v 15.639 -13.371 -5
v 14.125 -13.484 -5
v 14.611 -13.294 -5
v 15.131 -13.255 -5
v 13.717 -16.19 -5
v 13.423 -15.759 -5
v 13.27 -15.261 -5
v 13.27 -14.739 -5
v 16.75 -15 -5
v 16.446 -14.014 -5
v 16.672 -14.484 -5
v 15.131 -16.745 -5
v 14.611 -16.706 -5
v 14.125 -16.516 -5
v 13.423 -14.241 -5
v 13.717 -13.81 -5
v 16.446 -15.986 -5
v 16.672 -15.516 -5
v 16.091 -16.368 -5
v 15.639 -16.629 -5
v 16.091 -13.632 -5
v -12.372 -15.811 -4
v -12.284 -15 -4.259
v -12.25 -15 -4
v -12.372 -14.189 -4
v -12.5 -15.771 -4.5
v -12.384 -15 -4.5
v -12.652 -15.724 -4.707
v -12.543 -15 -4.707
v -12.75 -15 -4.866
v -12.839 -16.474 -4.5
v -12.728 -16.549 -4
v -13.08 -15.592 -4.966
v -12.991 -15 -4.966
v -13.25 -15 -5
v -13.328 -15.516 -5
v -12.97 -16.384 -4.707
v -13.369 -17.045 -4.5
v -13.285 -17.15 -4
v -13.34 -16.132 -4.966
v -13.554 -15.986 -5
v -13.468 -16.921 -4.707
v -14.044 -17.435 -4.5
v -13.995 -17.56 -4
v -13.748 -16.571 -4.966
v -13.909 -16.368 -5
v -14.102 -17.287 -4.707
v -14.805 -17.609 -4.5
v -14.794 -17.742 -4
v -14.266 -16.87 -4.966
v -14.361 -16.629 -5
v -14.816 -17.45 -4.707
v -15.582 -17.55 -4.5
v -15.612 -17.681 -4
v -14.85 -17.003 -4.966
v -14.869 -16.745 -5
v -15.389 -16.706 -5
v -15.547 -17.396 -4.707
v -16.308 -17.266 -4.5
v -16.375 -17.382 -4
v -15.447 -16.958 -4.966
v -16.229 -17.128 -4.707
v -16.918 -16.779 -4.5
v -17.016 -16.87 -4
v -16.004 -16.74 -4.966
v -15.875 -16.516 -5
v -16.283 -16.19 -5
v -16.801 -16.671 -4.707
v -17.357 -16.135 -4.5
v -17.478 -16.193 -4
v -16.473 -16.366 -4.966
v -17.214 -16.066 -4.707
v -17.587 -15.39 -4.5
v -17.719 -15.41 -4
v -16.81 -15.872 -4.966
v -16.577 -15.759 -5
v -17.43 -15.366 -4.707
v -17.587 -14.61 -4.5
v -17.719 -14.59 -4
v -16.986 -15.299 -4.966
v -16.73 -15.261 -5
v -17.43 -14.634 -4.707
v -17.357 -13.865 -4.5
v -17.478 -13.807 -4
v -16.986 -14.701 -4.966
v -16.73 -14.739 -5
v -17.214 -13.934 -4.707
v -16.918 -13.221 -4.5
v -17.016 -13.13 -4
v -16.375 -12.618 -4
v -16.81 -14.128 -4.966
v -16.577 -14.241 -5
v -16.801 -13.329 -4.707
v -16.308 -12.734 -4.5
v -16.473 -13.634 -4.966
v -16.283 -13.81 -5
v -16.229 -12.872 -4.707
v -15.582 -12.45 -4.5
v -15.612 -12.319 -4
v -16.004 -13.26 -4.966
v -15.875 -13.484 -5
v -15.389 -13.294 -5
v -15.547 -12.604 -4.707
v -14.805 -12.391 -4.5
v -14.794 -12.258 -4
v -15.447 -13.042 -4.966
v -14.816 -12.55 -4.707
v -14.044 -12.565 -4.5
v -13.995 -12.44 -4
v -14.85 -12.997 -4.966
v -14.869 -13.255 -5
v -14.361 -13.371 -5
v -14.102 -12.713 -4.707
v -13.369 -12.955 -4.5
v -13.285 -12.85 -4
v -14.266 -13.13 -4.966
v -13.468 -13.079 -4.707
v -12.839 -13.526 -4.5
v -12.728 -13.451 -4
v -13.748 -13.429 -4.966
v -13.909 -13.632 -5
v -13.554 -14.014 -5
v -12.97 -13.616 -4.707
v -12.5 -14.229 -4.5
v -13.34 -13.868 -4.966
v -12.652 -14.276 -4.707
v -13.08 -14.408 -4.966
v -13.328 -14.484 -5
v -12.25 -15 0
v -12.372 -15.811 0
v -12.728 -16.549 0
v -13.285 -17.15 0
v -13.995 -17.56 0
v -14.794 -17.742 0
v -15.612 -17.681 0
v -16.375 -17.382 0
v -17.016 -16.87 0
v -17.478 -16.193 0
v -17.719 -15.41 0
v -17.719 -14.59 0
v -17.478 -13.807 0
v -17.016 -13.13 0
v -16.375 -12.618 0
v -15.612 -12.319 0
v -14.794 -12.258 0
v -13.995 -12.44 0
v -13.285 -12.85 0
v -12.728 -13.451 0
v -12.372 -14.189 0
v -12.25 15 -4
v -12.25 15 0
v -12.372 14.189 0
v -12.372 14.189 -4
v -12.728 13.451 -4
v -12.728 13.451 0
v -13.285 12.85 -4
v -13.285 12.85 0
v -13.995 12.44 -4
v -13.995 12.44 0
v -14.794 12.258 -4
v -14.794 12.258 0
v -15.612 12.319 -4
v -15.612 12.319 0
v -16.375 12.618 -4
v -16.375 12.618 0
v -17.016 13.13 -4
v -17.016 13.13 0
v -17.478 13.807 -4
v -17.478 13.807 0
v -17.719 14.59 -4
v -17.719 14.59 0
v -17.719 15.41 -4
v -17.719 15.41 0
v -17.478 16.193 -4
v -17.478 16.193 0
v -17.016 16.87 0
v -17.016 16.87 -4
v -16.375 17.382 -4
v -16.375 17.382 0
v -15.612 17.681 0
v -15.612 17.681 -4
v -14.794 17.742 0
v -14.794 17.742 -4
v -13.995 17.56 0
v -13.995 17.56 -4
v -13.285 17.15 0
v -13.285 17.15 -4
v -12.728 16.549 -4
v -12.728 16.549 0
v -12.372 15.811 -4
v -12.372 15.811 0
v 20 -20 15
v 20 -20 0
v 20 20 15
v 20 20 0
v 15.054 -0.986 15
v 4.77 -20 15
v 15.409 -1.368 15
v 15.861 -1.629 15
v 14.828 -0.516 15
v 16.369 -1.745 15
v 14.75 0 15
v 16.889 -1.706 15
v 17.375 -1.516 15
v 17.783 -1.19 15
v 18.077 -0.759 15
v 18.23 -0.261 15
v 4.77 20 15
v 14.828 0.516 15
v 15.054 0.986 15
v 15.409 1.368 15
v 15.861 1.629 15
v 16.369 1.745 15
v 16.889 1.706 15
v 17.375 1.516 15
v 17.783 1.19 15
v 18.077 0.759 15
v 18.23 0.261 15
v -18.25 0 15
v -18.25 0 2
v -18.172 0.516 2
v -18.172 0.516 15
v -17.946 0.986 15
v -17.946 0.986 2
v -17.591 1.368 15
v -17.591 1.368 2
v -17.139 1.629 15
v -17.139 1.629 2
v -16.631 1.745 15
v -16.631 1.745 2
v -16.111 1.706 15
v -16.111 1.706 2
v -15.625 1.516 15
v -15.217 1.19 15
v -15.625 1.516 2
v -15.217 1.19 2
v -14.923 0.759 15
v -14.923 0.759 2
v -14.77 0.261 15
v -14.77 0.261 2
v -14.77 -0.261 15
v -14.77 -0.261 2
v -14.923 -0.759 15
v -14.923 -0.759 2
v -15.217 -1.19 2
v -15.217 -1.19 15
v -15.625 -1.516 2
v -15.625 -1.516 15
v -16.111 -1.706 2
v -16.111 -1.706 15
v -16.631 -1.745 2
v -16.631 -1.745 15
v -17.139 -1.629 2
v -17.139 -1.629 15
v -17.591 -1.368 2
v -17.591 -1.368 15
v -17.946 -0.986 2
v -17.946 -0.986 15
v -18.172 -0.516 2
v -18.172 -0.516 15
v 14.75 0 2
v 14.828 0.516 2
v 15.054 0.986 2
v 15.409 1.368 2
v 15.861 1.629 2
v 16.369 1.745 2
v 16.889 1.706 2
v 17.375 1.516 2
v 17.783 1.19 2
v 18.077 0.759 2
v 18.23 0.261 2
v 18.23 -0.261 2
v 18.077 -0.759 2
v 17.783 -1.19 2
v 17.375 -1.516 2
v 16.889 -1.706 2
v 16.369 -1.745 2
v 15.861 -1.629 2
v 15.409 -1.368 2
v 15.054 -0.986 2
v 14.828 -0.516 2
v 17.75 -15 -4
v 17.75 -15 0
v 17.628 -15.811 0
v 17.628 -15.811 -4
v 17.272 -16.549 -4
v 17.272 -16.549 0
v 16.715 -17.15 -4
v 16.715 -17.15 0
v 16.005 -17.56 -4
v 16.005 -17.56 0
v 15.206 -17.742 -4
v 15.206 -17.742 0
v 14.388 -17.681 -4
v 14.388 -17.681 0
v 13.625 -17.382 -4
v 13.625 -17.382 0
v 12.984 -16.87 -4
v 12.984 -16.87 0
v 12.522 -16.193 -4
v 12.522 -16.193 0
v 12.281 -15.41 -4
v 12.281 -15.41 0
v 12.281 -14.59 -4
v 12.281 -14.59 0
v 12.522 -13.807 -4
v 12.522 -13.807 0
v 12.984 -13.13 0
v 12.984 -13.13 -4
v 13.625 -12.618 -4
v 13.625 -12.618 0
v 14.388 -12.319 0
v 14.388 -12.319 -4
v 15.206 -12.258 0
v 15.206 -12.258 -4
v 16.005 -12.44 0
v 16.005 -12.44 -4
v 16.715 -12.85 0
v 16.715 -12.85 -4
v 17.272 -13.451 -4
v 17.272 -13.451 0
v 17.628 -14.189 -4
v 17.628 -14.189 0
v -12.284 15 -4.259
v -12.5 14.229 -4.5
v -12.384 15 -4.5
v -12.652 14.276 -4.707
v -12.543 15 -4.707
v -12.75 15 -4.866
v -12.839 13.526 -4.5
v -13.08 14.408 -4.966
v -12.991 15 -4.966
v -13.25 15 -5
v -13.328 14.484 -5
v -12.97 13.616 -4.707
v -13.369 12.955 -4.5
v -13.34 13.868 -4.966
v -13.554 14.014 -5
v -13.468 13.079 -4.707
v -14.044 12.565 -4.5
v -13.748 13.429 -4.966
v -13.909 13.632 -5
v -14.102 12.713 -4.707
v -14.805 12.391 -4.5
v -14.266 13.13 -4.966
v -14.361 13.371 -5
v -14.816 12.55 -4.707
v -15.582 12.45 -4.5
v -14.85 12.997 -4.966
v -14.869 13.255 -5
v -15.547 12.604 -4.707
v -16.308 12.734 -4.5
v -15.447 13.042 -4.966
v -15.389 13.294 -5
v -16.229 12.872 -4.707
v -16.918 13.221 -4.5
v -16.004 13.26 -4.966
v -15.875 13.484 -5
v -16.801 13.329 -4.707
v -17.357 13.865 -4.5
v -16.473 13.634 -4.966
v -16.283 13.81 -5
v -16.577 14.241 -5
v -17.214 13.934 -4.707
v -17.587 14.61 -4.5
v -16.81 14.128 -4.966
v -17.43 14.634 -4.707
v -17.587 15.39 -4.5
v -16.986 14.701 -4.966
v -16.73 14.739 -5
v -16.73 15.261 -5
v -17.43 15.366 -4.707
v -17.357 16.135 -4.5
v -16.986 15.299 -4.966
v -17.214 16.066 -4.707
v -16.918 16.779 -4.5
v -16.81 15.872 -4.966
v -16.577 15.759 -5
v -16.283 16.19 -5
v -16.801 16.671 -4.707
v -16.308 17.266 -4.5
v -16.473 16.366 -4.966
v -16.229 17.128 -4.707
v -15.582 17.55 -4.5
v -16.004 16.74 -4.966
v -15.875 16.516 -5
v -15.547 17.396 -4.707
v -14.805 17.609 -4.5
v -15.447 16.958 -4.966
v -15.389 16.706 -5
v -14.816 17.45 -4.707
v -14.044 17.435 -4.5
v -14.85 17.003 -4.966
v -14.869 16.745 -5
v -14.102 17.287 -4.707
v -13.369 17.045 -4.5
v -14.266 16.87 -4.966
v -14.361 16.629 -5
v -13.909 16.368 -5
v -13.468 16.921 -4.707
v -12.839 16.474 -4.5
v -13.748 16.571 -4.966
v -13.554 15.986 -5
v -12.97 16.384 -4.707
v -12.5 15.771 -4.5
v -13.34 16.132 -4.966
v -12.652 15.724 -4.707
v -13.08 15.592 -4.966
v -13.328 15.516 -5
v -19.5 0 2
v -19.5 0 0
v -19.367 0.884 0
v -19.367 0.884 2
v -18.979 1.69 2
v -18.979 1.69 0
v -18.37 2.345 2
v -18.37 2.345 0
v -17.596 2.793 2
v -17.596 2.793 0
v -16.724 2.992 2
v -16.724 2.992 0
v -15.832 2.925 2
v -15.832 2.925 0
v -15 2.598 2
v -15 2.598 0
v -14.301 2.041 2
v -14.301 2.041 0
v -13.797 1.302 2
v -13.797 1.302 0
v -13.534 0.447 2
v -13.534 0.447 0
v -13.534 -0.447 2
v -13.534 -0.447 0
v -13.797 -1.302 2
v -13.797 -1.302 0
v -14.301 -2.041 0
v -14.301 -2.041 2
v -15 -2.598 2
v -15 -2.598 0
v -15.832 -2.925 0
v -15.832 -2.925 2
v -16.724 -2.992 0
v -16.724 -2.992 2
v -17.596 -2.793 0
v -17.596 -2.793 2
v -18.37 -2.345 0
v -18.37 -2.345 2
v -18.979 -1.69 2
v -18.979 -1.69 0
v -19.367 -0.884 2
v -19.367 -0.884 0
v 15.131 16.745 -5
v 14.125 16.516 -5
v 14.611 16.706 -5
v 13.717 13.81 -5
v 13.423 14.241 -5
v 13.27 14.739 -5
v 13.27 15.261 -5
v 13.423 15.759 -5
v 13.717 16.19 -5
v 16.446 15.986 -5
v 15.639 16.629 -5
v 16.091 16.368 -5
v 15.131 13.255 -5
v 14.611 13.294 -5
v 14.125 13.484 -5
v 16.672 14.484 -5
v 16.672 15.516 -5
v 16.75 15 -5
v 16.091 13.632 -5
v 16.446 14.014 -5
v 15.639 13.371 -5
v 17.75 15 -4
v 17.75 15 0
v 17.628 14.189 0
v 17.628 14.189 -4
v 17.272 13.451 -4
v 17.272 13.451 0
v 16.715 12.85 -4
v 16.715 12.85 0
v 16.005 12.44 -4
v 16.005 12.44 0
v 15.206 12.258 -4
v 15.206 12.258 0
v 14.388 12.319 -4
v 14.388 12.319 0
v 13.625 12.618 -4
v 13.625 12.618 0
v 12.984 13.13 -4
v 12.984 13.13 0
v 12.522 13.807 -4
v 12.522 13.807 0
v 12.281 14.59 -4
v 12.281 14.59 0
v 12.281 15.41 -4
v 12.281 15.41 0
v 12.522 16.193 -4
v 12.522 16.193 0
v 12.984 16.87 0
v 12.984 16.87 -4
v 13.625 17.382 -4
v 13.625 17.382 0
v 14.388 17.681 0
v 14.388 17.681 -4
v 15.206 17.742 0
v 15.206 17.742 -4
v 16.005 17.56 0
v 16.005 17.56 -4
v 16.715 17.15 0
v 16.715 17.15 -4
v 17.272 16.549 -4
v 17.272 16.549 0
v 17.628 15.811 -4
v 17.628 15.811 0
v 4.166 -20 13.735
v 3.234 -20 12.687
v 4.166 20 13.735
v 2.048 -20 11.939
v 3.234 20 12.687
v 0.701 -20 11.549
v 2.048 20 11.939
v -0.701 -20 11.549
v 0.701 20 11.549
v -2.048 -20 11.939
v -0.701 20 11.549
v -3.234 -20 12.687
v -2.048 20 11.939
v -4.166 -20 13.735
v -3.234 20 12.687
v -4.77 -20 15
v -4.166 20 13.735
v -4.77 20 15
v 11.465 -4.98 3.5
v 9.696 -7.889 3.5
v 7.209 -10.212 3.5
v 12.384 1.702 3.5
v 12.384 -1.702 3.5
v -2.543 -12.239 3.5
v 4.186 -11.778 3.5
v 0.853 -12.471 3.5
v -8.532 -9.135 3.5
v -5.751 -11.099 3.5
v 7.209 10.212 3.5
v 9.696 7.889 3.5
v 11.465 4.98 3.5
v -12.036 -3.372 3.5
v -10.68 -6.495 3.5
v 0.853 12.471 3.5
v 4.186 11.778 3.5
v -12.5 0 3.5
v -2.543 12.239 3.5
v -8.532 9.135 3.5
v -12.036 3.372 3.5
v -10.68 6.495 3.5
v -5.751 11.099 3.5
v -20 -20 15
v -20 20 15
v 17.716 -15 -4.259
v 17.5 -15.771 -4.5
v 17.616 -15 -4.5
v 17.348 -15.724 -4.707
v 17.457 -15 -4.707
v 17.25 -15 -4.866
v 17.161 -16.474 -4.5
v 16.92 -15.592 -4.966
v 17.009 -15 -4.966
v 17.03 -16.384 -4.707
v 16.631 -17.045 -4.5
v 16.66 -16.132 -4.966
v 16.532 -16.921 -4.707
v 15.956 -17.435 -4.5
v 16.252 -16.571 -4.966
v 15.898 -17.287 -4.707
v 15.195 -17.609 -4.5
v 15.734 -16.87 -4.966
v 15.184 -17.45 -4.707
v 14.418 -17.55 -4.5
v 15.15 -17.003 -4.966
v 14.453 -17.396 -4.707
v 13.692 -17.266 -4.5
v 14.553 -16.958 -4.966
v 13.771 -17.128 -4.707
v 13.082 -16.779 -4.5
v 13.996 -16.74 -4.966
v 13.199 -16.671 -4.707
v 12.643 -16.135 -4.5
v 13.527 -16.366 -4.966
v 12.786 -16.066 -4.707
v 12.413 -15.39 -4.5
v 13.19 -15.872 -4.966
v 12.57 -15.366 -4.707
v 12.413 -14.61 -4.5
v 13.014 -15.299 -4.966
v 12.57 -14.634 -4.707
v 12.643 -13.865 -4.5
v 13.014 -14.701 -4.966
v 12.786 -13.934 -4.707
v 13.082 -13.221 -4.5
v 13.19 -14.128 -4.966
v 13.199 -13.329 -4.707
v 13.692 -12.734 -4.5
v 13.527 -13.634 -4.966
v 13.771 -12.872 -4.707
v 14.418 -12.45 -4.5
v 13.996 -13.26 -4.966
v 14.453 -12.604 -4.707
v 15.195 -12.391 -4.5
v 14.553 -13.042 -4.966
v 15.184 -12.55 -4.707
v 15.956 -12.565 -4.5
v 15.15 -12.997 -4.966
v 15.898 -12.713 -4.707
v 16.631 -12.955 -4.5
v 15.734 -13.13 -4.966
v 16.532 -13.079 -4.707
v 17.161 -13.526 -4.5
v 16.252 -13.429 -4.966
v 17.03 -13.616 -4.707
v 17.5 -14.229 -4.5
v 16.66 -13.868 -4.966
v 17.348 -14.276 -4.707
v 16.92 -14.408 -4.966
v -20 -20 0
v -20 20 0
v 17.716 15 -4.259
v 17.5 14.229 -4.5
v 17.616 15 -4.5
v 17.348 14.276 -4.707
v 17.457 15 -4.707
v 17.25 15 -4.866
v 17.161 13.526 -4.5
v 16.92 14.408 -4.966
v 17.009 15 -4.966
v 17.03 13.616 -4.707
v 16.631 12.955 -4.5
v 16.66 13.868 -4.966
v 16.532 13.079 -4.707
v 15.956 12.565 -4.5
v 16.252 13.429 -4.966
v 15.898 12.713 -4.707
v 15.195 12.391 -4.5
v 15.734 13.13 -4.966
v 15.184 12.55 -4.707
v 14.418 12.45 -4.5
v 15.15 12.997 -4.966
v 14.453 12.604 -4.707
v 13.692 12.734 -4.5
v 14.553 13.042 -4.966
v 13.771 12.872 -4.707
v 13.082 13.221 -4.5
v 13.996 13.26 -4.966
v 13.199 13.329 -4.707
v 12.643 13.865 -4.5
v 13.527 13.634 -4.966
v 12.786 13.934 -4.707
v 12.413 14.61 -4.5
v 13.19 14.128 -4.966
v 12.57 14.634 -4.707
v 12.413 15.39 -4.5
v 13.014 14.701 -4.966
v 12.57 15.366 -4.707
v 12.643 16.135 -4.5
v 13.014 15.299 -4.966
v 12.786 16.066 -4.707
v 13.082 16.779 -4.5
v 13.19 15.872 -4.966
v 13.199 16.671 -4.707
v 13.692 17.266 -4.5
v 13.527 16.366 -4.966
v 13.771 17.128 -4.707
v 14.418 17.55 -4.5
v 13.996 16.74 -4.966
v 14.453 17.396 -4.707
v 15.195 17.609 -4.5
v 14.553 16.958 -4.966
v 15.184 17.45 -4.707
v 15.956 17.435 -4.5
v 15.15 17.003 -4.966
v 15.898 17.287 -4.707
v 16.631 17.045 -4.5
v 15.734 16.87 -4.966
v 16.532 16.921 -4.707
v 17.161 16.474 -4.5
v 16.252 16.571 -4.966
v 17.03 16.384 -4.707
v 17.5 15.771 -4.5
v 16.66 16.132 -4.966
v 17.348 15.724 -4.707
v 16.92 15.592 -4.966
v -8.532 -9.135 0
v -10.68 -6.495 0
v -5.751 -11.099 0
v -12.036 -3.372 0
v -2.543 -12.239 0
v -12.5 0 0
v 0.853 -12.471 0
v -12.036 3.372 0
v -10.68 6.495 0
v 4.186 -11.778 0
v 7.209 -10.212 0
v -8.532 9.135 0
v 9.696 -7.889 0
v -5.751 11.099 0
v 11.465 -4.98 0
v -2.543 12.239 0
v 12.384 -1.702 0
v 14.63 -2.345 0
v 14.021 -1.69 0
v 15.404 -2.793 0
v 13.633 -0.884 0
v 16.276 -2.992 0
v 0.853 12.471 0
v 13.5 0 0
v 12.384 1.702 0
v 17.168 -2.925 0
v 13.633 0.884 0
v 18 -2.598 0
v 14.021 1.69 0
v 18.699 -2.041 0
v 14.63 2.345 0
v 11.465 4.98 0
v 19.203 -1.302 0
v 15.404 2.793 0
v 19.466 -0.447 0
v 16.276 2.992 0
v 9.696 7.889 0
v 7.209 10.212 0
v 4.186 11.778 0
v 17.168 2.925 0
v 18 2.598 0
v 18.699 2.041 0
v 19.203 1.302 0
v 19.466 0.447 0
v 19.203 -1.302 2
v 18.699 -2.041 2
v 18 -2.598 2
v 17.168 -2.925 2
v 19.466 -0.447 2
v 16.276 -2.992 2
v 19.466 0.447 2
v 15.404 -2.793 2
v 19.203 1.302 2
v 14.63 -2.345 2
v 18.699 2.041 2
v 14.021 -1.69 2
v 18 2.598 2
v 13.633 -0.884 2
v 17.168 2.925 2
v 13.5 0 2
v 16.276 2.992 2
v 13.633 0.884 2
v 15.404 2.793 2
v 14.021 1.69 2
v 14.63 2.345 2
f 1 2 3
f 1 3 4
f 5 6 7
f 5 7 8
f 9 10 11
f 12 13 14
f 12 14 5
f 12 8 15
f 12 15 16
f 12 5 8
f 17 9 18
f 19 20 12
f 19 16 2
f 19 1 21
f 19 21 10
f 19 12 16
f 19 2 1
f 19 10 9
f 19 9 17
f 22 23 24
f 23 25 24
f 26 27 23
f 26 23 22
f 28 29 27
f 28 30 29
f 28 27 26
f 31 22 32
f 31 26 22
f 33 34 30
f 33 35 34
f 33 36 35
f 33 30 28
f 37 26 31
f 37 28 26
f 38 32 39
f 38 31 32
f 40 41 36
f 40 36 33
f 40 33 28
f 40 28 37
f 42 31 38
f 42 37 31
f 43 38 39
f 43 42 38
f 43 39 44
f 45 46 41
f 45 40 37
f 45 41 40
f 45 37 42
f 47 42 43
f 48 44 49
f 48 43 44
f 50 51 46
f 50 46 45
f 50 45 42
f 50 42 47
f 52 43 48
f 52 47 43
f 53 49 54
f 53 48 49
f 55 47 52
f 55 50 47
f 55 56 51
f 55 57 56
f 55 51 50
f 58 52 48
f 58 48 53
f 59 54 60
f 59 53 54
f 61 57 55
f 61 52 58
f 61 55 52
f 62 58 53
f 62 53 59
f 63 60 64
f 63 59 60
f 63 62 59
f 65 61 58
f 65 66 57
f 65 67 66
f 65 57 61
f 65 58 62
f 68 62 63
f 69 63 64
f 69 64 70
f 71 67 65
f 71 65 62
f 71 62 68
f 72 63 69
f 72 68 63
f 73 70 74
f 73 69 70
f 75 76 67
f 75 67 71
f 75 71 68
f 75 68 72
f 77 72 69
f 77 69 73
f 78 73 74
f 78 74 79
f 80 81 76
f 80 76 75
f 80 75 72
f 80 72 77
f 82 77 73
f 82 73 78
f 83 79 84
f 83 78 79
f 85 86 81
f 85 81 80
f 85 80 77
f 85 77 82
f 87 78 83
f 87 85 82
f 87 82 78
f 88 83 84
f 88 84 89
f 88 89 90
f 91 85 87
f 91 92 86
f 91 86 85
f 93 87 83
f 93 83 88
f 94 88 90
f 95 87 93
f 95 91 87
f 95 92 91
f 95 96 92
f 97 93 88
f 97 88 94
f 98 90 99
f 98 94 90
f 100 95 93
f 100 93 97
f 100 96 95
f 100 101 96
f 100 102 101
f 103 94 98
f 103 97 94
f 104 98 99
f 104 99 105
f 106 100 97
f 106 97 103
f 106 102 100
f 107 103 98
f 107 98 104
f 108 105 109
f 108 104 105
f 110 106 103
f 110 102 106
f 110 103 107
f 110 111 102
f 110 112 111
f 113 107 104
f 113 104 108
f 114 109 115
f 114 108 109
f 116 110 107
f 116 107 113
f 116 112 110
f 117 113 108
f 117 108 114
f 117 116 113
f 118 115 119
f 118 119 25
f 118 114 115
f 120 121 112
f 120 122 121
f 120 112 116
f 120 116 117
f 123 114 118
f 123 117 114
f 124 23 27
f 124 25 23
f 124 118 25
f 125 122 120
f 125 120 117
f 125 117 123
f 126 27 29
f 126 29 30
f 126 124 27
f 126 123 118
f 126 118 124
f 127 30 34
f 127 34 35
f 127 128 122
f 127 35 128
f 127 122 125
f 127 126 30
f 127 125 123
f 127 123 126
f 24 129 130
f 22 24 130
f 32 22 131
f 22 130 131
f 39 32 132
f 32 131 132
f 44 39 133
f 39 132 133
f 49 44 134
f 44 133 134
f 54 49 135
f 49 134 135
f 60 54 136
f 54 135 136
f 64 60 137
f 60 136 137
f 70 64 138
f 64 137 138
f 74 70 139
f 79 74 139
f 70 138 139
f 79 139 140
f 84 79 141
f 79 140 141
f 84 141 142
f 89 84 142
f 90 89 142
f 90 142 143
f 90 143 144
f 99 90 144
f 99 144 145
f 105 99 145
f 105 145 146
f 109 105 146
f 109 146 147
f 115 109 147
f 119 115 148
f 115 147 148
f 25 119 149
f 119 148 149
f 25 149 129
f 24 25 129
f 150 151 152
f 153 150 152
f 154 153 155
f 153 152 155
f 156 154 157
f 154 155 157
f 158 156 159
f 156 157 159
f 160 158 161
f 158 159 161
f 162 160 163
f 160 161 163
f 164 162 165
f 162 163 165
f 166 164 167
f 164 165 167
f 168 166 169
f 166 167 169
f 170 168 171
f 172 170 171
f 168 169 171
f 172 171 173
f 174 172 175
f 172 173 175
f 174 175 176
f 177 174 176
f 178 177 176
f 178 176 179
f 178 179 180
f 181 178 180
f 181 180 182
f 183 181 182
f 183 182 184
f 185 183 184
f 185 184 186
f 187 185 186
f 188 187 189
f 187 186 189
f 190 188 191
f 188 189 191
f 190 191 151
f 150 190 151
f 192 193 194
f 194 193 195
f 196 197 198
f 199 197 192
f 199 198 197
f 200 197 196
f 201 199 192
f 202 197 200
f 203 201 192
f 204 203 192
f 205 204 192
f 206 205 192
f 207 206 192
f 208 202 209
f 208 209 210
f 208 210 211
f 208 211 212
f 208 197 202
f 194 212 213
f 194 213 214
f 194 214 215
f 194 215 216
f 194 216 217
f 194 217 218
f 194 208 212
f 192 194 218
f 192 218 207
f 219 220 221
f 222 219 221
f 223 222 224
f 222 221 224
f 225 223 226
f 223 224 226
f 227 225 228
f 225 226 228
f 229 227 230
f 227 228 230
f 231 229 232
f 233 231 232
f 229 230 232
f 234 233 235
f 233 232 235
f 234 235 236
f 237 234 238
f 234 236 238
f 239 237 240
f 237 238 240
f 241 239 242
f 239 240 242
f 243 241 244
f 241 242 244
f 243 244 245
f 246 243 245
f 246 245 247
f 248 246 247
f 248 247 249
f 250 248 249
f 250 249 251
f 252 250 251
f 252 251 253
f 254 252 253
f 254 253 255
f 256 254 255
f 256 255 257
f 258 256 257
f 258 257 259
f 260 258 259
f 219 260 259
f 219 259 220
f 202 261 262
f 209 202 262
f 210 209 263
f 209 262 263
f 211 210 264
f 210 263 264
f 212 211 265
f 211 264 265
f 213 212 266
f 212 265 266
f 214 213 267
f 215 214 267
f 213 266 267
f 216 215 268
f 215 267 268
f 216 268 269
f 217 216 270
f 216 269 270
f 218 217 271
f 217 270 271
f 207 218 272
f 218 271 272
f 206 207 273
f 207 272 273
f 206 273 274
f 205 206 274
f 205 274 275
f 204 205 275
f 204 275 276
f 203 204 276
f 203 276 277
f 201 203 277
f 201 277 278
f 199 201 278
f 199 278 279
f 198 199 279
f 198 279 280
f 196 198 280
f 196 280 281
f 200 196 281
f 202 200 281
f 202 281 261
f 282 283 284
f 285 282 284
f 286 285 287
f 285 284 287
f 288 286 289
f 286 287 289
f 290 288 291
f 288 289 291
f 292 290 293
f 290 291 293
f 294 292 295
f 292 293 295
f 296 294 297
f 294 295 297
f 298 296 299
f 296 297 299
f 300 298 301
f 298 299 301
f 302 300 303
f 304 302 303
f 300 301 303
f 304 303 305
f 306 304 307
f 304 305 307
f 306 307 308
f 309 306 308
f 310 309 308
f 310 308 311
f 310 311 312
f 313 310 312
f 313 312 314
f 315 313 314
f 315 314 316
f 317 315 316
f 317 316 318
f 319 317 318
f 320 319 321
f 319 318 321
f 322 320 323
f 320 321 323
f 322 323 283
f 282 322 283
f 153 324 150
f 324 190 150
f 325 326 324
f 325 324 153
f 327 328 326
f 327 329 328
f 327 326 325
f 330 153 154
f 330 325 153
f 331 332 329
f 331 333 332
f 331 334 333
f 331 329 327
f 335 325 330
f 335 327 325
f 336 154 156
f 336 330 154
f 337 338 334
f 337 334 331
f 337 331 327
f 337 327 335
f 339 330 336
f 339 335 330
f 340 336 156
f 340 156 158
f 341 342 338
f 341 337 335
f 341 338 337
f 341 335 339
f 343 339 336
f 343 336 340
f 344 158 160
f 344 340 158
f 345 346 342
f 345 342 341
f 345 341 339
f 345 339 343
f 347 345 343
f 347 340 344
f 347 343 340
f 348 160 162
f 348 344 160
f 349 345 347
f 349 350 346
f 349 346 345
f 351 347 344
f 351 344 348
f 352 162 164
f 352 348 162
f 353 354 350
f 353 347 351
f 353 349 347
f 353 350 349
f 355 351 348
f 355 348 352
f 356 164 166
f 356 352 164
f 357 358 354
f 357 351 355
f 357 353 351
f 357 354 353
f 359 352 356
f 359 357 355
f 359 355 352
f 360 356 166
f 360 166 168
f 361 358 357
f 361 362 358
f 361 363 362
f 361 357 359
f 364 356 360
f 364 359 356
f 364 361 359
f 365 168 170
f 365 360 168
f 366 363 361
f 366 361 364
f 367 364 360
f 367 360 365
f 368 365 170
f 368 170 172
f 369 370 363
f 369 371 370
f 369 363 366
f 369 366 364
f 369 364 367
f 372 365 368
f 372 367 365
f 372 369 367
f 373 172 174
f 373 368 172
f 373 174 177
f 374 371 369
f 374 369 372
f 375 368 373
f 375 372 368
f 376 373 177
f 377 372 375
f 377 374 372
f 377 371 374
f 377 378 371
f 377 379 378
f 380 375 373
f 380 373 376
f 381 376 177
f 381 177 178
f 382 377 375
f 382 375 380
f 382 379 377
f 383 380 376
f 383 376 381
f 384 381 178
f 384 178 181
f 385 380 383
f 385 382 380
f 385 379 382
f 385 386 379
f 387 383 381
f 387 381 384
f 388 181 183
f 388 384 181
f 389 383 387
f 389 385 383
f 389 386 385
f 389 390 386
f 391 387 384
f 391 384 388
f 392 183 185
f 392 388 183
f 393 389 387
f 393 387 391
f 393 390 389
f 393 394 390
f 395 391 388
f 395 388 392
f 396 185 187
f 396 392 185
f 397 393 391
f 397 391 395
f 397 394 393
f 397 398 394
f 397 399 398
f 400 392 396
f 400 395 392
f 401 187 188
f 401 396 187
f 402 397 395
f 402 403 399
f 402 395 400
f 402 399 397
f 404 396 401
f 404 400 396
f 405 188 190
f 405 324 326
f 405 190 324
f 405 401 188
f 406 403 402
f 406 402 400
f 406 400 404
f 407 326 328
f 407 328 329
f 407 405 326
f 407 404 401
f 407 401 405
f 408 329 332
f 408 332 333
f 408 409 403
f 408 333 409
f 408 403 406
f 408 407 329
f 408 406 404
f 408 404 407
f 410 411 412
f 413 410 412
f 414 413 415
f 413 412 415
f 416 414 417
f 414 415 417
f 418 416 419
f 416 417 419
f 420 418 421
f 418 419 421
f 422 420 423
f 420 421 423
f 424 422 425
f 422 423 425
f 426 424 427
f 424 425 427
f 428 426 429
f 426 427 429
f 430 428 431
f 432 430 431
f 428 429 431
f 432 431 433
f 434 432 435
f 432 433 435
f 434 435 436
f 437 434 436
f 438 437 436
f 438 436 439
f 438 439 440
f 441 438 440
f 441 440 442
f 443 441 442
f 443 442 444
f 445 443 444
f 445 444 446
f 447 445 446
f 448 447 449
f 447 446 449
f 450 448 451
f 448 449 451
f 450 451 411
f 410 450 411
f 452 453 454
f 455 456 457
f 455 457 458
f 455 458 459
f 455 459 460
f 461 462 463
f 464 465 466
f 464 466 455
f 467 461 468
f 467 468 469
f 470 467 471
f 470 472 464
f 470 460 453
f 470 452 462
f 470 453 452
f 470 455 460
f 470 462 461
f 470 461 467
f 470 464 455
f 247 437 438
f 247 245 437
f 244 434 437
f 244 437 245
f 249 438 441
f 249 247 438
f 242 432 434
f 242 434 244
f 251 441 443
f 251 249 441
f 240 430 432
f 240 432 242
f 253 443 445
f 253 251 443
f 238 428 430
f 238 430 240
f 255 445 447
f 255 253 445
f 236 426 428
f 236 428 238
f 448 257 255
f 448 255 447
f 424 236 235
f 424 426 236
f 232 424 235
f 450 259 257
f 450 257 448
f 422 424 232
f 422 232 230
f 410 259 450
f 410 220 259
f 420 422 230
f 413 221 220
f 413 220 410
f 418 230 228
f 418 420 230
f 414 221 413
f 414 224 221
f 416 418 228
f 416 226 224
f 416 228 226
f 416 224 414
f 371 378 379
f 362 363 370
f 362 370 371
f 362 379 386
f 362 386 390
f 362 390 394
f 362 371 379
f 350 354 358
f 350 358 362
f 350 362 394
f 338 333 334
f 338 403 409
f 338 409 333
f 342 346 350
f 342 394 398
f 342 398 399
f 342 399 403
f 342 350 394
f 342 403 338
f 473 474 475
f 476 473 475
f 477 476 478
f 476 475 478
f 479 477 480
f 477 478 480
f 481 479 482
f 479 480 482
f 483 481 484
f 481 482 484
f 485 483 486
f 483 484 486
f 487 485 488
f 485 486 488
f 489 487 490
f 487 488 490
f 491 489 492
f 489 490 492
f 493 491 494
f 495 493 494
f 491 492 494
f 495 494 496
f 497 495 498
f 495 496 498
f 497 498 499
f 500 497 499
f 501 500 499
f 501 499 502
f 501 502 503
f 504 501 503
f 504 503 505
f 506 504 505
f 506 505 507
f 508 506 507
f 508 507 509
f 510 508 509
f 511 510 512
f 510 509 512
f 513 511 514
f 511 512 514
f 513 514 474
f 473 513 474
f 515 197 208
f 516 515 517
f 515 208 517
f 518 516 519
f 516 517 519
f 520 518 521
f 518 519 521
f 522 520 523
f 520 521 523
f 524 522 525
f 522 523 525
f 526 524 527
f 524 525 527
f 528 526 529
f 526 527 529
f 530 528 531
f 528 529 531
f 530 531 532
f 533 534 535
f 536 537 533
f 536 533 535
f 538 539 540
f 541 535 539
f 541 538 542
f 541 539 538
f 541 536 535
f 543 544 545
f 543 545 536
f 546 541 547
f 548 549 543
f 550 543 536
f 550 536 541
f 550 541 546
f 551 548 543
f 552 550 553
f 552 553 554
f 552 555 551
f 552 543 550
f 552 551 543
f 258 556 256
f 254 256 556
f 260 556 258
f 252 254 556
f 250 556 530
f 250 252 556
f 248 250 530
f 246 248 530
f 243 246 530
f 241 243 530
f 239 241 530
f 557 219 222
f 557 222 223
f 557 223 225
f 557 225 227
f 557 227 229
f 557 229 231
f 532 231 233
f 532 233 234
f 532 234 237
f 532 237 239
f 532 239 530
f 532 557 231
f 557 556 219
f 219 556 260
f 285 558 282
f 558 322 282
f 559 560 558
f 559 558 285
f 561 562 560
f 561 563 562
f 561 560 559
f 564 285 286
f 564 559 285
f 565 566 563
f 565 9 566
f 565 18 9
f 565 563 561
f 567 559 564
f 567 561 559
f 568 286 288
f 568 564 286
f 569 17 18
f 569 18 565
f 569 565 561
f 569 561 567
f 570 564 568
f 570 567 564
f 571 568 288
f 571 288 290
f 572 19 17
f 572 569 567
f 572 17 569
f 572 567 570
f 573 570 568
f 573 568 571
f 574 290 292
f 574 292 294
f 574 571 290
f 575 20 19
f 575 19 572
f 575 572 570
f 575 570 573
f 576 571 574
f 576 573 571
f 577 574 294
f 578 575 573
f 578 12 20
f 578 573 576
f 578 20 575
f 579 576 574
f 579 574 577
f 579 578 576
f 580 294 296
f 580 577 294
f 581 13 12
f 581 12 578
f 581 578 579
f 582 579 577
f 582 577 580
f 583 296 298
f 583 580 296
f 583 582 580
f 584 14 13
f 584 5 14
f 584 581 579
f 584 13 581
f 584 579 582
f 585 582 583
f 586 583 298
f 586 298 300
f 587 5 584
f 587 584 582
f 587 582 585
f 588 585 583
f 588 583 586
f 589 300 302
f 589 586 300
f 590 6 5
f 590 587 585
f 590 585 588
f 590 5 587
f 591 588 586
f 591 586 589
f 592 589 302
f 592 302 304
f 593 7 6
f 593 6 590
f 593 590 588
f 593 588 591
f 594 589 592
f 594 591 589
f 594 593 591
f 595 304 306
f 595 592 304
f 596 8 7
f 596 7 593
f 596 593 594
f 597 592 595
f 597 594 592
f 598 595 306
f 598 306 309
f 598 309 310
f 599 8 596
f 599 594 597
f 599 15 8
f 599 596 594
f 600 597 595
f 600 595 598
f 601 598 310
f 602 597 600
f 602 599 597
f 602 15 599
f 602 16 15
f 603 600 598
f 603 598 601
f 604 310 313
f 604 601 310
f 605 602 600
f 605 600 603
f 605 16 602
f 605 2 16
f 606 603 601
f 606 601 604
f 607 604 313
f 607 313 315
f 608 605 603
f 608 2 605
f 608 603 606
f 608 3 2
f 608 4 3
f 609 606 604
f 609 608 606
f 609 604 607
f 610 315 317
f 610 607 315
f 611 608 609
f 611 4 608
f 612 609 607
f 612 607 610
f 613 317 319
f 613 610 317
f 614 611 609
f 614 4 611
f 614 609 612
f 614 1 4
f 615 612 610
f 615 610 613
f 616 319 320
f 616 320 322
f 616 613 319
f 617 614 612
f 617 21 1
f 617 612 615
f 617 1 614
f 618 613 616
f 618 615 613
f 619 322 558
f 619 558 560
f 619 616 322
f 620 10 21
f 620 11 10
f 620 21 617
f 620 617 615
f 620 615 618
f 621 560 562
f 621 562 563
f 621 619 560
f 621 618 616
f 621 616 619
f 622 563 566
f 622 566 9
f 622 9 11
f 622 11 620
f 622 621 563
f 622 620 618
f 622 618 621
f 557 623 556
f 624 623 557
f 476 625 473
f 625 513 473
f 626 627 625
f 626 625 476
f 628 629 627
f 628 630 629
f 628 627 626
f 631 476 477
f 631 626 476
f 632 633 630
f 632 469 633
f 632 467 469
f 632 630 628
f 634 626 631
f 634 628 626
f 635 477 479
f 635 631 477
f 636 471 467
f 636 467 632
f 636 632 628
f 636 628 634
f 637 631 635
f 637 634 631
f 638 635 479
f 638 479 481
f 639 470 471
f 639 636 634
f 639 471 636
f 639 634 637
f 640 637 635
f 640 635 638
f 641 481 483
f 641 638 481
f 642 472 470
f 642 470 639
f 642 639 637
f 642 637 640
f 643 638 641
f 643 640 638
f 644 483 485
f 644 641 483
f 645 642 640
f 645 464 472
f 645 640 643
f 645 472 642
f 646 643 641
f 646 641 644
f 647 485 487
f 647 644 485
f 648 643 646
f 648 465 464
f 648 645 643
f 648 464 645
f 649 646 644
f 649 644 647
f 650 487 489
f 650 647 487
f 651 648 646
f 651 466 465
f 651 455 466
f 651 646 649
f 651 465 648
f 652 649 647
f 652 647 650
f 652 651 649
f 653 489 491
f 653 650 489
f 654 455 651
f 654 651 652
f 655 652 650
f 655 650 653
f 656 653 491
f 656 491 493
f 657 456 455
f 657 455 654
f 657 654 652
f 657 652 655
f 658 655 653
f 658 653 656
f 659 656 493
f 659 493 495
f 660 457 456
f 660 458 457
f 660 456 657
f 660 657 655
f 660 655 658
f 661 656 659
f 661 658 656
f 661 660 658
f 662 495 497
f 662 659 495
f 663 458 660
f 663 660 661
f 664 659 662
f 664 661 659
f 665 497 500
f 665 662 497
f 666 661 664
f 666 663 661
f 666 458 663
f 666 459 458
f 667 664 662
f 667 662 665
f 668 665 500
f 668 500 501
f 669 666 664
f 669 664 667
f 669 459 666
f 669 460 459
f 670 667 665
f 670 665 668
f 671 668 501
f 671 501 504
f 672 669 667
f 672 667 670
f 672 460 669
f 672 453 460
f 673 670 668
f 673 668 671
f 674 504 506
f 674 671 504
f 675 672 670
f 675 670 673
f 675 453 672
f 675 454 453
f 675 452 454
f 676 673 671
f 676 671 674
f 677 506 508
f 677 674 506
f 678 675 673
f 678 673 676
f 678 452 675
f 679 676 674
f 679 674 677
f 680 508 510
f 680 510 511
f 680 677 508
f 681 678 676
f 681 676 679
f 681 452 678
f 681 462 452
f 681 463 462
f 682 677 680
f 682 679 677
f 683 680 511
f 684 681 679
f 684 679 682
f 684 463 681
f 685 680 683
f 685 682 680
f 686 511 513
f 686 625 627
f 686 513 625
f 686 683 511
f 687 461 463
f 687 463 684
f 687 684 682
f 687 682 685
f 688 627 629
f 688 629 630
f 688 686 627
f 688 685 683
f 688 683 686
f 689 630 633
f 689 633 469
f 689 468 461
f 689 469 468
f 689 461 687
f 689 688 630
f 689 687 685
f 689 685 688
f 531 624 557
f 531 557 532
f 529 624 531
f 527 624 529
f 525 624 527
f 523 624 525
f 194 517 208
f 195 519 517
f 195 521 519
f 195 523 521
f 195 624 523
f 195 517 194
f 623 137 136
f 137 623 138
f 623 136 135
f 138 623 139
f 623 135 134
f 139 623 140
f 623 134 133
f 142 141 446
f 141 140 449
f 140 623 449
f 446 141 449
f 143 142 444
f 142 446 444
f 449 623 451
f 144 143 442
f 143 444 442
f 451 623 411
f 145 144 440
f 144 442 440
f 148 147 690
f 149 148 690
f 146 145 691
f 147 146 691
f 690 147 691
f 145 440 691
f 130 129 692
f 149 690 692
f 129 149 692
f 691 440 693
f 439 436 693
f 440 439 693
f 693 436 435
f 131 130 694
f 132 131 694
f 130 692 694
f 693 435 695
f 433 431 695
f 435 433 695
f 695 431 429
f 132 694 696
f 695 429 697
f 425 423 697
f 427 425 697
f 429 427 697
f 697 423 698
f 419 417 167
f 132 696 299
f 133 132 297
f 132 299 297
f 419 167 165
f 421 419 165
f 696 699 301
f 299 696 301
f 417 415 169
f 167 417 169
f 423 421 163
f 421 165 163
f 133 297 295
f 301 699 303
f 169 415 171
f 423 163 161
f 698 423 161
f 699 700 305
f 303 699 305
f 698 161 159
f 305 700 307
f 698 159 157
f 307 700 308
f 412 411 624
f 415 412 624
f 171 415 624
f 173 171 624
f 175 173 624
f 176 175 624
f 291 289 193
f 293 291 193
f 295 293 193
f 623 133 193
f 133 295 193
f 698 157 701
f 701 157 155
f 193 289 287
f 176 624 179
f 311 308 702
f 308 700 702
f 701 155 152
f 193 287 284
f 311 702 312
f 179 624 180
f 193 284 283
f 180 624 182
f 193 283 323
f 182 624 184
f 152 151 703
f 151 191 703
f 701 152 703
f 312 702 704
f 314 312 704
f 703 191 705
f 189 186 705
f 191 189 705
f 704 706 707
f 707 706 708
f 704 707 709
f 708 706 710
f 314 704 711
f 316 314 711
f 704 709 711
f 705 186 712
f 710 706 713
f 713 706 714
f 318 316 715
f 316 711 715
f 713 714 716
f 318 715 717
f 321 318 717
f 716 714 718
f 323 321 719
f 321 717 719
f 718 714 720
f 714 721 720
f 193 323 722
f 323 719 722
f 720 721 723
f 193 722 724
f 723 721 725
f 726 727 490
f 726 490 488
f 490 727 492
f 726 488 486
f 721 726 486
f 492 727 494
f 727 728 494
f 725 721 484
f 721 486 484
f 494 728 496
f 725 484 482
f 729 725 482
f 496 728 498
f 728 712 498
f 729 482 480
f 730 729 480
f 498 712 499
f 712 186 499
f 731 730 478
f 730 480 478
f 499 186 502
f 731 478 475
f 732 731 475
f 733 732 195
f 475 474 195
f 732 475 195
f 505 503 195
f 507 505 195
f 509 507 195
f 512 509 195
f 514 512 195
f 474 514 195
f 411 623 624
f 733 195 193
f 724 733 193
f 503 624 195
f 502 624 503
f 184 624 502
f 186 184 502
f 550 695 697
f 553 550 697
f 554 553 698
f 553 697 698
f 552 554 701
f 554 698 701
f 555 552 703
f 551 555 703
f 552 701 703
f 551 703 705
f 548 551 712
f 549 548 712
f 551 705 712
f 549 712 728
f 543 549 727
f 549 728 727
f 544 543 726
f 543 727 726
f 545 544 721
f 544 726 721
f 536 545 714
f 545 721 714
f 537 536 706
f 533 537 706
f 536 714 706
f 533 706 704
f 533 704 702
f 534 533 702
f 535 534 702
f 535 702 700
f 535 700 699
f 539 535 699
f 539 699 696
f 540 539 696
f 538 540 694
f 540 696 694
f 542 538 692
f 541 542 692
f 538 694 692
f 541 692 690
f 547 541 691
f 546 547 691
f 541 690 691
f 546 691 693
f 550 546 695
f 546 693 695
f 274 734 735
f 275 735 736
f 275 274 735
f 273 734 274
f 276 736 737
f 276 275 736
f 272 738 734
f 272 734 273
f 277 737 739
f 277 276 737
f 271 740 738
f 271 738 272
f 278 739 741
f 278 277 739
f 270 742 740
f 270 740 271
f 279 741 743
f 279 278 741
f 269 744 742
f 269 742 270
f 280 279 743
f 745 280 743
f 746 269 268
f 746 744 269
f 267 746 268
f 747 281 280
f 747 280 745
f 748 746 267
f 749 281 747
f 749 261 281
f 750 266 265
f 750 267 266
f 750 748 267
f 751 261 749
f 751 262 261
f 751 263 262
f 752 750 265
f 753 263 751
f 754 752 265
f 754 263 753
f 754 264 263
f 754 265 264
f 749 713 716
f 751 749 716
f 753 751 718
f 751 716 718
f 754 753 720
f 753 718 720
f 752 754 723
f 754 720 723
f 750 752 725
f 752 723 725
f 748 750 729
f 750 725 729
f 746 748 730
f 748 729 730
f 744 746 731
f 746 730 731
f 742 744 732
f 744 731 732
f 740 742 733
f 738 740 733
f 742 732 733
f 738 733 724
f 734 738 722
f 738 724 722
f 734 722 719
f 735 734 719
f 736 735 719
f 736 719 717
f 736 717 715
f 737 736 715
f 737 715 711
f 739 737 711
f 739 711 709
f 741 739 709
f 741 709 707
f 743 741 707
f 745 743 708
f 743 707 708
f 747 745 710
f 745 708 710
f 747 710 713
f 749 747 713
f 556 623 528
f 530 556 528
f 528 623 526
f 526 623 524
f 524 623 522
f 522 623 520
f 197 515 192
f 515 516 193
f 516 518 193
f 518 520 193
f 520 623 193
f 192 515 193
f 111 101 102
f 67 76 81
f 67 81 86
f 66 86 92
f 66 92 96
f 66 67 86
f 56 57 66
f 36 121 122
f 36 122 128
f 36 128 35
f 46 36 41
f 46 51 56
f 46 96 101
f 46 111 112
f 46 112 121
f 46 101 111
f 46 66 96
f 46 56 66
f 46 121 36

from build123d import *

# Parameters (mm, degrees)
SKETCH1_W           = 40
SKETCH1_H           = 40
BOSS_EXTRUDE1_DEPTH = 15
SKETCH3_R           = 2.75
BOSS_EXTRUDE2_DEPTH = 5
FILLET1_R           = 1
SKETCH4_R           = 12.5
CUT_EXTRUDE1_DEPTH  = 3.5
SKETCH5_R           = 5
CUT_EXTRUDE2_DEPTH  = 41
SKETCH6_R           = 3
CUT_EXTRUDE3_DEPTH  = 2
SKETCH7_R           = 1.75
CUT_EXTRUDE4_DEPTH  = 16


with BuildPart() as part:
    # Sketch1 → Boss-Extrude1 (new body)
    with BuildSketch(Plane.XY):
        Rectangle(SKETCH1_W, SKETCH1_H)
    extrude(amount=BOSS_EXTRUDE1_DEPTH)

    # Sketch3 → Boss-Extrude2 (add)
    with BuildSketch(Plane(origin=(0, 0, 0), x_dir=(-1, 0, 0), z_dir=(0, 0, -1))):
        with Locations(Location((-15, 15, 0), (0, 0, 180))):  # turned: the seam where the file's is
            Circle(SKETCH3_R)
        with Locations(Location((15, 15, 0), (0, 0, 180))):  # turned: the seam where the file's is
            Circle(SKETCH3_R)
        with Locations(Location((-15, -15, 0), (0, 0, 180))):  # turned: the seam where the file's is
            Circle(SKETCH3_R)
        with Locations(Location((15, -15, 0), (0, 0, 180))):  # turned: the seam where the file's is
            Circle(SKETCH3_R)
    extrude(amount=BOSS_EXTRUDE2_DEPTH)

    # Fillet1
    fillet1_edges = [part.edges().sort_by_distance(p)[0] for p in [
        (12.25, 15, -5),
        (-17.75, 15, -5),
        (12.25, -15, -5),
        (-17.75, -15, -5),
    ]]
    fillet(fillet1_edges, radius=FILLET1_R)

    # Sketch4 → Cut-Extrude1 (cut)
    with BuildSketch(Plane(origin=(0, 0, 0), x_dir=(-1, 0, 0), z_dir=(0, 0, -1))):
        Circle(SKETCH4_R)
    extrude(amount=-CUT_EXTRUDE1_DEPTH, mode=Mode.SUBTRACT)

    # Sketch5 → Cut-Extrude2 (cut, through all)
    with BuildSketch(Plane(origin=(0, 20, 0), x_dir=(1, 0, 0), z_dir=(0, 1, 0))):
        with Locations((0, -16.5)):
            Circle(SKETCH5_R)
    extrude(amount=-CUT_EXTRUDE2_DEPTH, mode=Mode.SUBTRACT)

    # Sketch6 → Cut-Extrude3 (cut)
    with BuildSketch(Plane(origin=(0, 0, 0), x_dir=(-1, 0, 0), z_dir=(0, 0, -1))):
        with Locations((-16.5, 0)):
            Circle(SKETCH6_R)
        with Locations((16.5, 0)):
            Circle(SKETCH6_R)
    extrude(amount=-CUT_EXTRUDE3_DEPTH, mode=Mode.SUBTRACT)

    # Sketch7 → Cut-Extrude4 (cut, through all)
    with BuildSketch(Plane(origin=(0, 0, 0), x_dir=(-1, 0, 0), z_dir=(0, 0, -1))):
        with Locations((16.5, 0)):
            Circle(SKETCH7_R)
        with Locations((-16.5, 0)):
            Circle(SKETCH7_R)
    extrude(amount=-CUT_EXTRUDE4_DEPTH, mode=Mode.SUBTRACT)


solid = part.part
